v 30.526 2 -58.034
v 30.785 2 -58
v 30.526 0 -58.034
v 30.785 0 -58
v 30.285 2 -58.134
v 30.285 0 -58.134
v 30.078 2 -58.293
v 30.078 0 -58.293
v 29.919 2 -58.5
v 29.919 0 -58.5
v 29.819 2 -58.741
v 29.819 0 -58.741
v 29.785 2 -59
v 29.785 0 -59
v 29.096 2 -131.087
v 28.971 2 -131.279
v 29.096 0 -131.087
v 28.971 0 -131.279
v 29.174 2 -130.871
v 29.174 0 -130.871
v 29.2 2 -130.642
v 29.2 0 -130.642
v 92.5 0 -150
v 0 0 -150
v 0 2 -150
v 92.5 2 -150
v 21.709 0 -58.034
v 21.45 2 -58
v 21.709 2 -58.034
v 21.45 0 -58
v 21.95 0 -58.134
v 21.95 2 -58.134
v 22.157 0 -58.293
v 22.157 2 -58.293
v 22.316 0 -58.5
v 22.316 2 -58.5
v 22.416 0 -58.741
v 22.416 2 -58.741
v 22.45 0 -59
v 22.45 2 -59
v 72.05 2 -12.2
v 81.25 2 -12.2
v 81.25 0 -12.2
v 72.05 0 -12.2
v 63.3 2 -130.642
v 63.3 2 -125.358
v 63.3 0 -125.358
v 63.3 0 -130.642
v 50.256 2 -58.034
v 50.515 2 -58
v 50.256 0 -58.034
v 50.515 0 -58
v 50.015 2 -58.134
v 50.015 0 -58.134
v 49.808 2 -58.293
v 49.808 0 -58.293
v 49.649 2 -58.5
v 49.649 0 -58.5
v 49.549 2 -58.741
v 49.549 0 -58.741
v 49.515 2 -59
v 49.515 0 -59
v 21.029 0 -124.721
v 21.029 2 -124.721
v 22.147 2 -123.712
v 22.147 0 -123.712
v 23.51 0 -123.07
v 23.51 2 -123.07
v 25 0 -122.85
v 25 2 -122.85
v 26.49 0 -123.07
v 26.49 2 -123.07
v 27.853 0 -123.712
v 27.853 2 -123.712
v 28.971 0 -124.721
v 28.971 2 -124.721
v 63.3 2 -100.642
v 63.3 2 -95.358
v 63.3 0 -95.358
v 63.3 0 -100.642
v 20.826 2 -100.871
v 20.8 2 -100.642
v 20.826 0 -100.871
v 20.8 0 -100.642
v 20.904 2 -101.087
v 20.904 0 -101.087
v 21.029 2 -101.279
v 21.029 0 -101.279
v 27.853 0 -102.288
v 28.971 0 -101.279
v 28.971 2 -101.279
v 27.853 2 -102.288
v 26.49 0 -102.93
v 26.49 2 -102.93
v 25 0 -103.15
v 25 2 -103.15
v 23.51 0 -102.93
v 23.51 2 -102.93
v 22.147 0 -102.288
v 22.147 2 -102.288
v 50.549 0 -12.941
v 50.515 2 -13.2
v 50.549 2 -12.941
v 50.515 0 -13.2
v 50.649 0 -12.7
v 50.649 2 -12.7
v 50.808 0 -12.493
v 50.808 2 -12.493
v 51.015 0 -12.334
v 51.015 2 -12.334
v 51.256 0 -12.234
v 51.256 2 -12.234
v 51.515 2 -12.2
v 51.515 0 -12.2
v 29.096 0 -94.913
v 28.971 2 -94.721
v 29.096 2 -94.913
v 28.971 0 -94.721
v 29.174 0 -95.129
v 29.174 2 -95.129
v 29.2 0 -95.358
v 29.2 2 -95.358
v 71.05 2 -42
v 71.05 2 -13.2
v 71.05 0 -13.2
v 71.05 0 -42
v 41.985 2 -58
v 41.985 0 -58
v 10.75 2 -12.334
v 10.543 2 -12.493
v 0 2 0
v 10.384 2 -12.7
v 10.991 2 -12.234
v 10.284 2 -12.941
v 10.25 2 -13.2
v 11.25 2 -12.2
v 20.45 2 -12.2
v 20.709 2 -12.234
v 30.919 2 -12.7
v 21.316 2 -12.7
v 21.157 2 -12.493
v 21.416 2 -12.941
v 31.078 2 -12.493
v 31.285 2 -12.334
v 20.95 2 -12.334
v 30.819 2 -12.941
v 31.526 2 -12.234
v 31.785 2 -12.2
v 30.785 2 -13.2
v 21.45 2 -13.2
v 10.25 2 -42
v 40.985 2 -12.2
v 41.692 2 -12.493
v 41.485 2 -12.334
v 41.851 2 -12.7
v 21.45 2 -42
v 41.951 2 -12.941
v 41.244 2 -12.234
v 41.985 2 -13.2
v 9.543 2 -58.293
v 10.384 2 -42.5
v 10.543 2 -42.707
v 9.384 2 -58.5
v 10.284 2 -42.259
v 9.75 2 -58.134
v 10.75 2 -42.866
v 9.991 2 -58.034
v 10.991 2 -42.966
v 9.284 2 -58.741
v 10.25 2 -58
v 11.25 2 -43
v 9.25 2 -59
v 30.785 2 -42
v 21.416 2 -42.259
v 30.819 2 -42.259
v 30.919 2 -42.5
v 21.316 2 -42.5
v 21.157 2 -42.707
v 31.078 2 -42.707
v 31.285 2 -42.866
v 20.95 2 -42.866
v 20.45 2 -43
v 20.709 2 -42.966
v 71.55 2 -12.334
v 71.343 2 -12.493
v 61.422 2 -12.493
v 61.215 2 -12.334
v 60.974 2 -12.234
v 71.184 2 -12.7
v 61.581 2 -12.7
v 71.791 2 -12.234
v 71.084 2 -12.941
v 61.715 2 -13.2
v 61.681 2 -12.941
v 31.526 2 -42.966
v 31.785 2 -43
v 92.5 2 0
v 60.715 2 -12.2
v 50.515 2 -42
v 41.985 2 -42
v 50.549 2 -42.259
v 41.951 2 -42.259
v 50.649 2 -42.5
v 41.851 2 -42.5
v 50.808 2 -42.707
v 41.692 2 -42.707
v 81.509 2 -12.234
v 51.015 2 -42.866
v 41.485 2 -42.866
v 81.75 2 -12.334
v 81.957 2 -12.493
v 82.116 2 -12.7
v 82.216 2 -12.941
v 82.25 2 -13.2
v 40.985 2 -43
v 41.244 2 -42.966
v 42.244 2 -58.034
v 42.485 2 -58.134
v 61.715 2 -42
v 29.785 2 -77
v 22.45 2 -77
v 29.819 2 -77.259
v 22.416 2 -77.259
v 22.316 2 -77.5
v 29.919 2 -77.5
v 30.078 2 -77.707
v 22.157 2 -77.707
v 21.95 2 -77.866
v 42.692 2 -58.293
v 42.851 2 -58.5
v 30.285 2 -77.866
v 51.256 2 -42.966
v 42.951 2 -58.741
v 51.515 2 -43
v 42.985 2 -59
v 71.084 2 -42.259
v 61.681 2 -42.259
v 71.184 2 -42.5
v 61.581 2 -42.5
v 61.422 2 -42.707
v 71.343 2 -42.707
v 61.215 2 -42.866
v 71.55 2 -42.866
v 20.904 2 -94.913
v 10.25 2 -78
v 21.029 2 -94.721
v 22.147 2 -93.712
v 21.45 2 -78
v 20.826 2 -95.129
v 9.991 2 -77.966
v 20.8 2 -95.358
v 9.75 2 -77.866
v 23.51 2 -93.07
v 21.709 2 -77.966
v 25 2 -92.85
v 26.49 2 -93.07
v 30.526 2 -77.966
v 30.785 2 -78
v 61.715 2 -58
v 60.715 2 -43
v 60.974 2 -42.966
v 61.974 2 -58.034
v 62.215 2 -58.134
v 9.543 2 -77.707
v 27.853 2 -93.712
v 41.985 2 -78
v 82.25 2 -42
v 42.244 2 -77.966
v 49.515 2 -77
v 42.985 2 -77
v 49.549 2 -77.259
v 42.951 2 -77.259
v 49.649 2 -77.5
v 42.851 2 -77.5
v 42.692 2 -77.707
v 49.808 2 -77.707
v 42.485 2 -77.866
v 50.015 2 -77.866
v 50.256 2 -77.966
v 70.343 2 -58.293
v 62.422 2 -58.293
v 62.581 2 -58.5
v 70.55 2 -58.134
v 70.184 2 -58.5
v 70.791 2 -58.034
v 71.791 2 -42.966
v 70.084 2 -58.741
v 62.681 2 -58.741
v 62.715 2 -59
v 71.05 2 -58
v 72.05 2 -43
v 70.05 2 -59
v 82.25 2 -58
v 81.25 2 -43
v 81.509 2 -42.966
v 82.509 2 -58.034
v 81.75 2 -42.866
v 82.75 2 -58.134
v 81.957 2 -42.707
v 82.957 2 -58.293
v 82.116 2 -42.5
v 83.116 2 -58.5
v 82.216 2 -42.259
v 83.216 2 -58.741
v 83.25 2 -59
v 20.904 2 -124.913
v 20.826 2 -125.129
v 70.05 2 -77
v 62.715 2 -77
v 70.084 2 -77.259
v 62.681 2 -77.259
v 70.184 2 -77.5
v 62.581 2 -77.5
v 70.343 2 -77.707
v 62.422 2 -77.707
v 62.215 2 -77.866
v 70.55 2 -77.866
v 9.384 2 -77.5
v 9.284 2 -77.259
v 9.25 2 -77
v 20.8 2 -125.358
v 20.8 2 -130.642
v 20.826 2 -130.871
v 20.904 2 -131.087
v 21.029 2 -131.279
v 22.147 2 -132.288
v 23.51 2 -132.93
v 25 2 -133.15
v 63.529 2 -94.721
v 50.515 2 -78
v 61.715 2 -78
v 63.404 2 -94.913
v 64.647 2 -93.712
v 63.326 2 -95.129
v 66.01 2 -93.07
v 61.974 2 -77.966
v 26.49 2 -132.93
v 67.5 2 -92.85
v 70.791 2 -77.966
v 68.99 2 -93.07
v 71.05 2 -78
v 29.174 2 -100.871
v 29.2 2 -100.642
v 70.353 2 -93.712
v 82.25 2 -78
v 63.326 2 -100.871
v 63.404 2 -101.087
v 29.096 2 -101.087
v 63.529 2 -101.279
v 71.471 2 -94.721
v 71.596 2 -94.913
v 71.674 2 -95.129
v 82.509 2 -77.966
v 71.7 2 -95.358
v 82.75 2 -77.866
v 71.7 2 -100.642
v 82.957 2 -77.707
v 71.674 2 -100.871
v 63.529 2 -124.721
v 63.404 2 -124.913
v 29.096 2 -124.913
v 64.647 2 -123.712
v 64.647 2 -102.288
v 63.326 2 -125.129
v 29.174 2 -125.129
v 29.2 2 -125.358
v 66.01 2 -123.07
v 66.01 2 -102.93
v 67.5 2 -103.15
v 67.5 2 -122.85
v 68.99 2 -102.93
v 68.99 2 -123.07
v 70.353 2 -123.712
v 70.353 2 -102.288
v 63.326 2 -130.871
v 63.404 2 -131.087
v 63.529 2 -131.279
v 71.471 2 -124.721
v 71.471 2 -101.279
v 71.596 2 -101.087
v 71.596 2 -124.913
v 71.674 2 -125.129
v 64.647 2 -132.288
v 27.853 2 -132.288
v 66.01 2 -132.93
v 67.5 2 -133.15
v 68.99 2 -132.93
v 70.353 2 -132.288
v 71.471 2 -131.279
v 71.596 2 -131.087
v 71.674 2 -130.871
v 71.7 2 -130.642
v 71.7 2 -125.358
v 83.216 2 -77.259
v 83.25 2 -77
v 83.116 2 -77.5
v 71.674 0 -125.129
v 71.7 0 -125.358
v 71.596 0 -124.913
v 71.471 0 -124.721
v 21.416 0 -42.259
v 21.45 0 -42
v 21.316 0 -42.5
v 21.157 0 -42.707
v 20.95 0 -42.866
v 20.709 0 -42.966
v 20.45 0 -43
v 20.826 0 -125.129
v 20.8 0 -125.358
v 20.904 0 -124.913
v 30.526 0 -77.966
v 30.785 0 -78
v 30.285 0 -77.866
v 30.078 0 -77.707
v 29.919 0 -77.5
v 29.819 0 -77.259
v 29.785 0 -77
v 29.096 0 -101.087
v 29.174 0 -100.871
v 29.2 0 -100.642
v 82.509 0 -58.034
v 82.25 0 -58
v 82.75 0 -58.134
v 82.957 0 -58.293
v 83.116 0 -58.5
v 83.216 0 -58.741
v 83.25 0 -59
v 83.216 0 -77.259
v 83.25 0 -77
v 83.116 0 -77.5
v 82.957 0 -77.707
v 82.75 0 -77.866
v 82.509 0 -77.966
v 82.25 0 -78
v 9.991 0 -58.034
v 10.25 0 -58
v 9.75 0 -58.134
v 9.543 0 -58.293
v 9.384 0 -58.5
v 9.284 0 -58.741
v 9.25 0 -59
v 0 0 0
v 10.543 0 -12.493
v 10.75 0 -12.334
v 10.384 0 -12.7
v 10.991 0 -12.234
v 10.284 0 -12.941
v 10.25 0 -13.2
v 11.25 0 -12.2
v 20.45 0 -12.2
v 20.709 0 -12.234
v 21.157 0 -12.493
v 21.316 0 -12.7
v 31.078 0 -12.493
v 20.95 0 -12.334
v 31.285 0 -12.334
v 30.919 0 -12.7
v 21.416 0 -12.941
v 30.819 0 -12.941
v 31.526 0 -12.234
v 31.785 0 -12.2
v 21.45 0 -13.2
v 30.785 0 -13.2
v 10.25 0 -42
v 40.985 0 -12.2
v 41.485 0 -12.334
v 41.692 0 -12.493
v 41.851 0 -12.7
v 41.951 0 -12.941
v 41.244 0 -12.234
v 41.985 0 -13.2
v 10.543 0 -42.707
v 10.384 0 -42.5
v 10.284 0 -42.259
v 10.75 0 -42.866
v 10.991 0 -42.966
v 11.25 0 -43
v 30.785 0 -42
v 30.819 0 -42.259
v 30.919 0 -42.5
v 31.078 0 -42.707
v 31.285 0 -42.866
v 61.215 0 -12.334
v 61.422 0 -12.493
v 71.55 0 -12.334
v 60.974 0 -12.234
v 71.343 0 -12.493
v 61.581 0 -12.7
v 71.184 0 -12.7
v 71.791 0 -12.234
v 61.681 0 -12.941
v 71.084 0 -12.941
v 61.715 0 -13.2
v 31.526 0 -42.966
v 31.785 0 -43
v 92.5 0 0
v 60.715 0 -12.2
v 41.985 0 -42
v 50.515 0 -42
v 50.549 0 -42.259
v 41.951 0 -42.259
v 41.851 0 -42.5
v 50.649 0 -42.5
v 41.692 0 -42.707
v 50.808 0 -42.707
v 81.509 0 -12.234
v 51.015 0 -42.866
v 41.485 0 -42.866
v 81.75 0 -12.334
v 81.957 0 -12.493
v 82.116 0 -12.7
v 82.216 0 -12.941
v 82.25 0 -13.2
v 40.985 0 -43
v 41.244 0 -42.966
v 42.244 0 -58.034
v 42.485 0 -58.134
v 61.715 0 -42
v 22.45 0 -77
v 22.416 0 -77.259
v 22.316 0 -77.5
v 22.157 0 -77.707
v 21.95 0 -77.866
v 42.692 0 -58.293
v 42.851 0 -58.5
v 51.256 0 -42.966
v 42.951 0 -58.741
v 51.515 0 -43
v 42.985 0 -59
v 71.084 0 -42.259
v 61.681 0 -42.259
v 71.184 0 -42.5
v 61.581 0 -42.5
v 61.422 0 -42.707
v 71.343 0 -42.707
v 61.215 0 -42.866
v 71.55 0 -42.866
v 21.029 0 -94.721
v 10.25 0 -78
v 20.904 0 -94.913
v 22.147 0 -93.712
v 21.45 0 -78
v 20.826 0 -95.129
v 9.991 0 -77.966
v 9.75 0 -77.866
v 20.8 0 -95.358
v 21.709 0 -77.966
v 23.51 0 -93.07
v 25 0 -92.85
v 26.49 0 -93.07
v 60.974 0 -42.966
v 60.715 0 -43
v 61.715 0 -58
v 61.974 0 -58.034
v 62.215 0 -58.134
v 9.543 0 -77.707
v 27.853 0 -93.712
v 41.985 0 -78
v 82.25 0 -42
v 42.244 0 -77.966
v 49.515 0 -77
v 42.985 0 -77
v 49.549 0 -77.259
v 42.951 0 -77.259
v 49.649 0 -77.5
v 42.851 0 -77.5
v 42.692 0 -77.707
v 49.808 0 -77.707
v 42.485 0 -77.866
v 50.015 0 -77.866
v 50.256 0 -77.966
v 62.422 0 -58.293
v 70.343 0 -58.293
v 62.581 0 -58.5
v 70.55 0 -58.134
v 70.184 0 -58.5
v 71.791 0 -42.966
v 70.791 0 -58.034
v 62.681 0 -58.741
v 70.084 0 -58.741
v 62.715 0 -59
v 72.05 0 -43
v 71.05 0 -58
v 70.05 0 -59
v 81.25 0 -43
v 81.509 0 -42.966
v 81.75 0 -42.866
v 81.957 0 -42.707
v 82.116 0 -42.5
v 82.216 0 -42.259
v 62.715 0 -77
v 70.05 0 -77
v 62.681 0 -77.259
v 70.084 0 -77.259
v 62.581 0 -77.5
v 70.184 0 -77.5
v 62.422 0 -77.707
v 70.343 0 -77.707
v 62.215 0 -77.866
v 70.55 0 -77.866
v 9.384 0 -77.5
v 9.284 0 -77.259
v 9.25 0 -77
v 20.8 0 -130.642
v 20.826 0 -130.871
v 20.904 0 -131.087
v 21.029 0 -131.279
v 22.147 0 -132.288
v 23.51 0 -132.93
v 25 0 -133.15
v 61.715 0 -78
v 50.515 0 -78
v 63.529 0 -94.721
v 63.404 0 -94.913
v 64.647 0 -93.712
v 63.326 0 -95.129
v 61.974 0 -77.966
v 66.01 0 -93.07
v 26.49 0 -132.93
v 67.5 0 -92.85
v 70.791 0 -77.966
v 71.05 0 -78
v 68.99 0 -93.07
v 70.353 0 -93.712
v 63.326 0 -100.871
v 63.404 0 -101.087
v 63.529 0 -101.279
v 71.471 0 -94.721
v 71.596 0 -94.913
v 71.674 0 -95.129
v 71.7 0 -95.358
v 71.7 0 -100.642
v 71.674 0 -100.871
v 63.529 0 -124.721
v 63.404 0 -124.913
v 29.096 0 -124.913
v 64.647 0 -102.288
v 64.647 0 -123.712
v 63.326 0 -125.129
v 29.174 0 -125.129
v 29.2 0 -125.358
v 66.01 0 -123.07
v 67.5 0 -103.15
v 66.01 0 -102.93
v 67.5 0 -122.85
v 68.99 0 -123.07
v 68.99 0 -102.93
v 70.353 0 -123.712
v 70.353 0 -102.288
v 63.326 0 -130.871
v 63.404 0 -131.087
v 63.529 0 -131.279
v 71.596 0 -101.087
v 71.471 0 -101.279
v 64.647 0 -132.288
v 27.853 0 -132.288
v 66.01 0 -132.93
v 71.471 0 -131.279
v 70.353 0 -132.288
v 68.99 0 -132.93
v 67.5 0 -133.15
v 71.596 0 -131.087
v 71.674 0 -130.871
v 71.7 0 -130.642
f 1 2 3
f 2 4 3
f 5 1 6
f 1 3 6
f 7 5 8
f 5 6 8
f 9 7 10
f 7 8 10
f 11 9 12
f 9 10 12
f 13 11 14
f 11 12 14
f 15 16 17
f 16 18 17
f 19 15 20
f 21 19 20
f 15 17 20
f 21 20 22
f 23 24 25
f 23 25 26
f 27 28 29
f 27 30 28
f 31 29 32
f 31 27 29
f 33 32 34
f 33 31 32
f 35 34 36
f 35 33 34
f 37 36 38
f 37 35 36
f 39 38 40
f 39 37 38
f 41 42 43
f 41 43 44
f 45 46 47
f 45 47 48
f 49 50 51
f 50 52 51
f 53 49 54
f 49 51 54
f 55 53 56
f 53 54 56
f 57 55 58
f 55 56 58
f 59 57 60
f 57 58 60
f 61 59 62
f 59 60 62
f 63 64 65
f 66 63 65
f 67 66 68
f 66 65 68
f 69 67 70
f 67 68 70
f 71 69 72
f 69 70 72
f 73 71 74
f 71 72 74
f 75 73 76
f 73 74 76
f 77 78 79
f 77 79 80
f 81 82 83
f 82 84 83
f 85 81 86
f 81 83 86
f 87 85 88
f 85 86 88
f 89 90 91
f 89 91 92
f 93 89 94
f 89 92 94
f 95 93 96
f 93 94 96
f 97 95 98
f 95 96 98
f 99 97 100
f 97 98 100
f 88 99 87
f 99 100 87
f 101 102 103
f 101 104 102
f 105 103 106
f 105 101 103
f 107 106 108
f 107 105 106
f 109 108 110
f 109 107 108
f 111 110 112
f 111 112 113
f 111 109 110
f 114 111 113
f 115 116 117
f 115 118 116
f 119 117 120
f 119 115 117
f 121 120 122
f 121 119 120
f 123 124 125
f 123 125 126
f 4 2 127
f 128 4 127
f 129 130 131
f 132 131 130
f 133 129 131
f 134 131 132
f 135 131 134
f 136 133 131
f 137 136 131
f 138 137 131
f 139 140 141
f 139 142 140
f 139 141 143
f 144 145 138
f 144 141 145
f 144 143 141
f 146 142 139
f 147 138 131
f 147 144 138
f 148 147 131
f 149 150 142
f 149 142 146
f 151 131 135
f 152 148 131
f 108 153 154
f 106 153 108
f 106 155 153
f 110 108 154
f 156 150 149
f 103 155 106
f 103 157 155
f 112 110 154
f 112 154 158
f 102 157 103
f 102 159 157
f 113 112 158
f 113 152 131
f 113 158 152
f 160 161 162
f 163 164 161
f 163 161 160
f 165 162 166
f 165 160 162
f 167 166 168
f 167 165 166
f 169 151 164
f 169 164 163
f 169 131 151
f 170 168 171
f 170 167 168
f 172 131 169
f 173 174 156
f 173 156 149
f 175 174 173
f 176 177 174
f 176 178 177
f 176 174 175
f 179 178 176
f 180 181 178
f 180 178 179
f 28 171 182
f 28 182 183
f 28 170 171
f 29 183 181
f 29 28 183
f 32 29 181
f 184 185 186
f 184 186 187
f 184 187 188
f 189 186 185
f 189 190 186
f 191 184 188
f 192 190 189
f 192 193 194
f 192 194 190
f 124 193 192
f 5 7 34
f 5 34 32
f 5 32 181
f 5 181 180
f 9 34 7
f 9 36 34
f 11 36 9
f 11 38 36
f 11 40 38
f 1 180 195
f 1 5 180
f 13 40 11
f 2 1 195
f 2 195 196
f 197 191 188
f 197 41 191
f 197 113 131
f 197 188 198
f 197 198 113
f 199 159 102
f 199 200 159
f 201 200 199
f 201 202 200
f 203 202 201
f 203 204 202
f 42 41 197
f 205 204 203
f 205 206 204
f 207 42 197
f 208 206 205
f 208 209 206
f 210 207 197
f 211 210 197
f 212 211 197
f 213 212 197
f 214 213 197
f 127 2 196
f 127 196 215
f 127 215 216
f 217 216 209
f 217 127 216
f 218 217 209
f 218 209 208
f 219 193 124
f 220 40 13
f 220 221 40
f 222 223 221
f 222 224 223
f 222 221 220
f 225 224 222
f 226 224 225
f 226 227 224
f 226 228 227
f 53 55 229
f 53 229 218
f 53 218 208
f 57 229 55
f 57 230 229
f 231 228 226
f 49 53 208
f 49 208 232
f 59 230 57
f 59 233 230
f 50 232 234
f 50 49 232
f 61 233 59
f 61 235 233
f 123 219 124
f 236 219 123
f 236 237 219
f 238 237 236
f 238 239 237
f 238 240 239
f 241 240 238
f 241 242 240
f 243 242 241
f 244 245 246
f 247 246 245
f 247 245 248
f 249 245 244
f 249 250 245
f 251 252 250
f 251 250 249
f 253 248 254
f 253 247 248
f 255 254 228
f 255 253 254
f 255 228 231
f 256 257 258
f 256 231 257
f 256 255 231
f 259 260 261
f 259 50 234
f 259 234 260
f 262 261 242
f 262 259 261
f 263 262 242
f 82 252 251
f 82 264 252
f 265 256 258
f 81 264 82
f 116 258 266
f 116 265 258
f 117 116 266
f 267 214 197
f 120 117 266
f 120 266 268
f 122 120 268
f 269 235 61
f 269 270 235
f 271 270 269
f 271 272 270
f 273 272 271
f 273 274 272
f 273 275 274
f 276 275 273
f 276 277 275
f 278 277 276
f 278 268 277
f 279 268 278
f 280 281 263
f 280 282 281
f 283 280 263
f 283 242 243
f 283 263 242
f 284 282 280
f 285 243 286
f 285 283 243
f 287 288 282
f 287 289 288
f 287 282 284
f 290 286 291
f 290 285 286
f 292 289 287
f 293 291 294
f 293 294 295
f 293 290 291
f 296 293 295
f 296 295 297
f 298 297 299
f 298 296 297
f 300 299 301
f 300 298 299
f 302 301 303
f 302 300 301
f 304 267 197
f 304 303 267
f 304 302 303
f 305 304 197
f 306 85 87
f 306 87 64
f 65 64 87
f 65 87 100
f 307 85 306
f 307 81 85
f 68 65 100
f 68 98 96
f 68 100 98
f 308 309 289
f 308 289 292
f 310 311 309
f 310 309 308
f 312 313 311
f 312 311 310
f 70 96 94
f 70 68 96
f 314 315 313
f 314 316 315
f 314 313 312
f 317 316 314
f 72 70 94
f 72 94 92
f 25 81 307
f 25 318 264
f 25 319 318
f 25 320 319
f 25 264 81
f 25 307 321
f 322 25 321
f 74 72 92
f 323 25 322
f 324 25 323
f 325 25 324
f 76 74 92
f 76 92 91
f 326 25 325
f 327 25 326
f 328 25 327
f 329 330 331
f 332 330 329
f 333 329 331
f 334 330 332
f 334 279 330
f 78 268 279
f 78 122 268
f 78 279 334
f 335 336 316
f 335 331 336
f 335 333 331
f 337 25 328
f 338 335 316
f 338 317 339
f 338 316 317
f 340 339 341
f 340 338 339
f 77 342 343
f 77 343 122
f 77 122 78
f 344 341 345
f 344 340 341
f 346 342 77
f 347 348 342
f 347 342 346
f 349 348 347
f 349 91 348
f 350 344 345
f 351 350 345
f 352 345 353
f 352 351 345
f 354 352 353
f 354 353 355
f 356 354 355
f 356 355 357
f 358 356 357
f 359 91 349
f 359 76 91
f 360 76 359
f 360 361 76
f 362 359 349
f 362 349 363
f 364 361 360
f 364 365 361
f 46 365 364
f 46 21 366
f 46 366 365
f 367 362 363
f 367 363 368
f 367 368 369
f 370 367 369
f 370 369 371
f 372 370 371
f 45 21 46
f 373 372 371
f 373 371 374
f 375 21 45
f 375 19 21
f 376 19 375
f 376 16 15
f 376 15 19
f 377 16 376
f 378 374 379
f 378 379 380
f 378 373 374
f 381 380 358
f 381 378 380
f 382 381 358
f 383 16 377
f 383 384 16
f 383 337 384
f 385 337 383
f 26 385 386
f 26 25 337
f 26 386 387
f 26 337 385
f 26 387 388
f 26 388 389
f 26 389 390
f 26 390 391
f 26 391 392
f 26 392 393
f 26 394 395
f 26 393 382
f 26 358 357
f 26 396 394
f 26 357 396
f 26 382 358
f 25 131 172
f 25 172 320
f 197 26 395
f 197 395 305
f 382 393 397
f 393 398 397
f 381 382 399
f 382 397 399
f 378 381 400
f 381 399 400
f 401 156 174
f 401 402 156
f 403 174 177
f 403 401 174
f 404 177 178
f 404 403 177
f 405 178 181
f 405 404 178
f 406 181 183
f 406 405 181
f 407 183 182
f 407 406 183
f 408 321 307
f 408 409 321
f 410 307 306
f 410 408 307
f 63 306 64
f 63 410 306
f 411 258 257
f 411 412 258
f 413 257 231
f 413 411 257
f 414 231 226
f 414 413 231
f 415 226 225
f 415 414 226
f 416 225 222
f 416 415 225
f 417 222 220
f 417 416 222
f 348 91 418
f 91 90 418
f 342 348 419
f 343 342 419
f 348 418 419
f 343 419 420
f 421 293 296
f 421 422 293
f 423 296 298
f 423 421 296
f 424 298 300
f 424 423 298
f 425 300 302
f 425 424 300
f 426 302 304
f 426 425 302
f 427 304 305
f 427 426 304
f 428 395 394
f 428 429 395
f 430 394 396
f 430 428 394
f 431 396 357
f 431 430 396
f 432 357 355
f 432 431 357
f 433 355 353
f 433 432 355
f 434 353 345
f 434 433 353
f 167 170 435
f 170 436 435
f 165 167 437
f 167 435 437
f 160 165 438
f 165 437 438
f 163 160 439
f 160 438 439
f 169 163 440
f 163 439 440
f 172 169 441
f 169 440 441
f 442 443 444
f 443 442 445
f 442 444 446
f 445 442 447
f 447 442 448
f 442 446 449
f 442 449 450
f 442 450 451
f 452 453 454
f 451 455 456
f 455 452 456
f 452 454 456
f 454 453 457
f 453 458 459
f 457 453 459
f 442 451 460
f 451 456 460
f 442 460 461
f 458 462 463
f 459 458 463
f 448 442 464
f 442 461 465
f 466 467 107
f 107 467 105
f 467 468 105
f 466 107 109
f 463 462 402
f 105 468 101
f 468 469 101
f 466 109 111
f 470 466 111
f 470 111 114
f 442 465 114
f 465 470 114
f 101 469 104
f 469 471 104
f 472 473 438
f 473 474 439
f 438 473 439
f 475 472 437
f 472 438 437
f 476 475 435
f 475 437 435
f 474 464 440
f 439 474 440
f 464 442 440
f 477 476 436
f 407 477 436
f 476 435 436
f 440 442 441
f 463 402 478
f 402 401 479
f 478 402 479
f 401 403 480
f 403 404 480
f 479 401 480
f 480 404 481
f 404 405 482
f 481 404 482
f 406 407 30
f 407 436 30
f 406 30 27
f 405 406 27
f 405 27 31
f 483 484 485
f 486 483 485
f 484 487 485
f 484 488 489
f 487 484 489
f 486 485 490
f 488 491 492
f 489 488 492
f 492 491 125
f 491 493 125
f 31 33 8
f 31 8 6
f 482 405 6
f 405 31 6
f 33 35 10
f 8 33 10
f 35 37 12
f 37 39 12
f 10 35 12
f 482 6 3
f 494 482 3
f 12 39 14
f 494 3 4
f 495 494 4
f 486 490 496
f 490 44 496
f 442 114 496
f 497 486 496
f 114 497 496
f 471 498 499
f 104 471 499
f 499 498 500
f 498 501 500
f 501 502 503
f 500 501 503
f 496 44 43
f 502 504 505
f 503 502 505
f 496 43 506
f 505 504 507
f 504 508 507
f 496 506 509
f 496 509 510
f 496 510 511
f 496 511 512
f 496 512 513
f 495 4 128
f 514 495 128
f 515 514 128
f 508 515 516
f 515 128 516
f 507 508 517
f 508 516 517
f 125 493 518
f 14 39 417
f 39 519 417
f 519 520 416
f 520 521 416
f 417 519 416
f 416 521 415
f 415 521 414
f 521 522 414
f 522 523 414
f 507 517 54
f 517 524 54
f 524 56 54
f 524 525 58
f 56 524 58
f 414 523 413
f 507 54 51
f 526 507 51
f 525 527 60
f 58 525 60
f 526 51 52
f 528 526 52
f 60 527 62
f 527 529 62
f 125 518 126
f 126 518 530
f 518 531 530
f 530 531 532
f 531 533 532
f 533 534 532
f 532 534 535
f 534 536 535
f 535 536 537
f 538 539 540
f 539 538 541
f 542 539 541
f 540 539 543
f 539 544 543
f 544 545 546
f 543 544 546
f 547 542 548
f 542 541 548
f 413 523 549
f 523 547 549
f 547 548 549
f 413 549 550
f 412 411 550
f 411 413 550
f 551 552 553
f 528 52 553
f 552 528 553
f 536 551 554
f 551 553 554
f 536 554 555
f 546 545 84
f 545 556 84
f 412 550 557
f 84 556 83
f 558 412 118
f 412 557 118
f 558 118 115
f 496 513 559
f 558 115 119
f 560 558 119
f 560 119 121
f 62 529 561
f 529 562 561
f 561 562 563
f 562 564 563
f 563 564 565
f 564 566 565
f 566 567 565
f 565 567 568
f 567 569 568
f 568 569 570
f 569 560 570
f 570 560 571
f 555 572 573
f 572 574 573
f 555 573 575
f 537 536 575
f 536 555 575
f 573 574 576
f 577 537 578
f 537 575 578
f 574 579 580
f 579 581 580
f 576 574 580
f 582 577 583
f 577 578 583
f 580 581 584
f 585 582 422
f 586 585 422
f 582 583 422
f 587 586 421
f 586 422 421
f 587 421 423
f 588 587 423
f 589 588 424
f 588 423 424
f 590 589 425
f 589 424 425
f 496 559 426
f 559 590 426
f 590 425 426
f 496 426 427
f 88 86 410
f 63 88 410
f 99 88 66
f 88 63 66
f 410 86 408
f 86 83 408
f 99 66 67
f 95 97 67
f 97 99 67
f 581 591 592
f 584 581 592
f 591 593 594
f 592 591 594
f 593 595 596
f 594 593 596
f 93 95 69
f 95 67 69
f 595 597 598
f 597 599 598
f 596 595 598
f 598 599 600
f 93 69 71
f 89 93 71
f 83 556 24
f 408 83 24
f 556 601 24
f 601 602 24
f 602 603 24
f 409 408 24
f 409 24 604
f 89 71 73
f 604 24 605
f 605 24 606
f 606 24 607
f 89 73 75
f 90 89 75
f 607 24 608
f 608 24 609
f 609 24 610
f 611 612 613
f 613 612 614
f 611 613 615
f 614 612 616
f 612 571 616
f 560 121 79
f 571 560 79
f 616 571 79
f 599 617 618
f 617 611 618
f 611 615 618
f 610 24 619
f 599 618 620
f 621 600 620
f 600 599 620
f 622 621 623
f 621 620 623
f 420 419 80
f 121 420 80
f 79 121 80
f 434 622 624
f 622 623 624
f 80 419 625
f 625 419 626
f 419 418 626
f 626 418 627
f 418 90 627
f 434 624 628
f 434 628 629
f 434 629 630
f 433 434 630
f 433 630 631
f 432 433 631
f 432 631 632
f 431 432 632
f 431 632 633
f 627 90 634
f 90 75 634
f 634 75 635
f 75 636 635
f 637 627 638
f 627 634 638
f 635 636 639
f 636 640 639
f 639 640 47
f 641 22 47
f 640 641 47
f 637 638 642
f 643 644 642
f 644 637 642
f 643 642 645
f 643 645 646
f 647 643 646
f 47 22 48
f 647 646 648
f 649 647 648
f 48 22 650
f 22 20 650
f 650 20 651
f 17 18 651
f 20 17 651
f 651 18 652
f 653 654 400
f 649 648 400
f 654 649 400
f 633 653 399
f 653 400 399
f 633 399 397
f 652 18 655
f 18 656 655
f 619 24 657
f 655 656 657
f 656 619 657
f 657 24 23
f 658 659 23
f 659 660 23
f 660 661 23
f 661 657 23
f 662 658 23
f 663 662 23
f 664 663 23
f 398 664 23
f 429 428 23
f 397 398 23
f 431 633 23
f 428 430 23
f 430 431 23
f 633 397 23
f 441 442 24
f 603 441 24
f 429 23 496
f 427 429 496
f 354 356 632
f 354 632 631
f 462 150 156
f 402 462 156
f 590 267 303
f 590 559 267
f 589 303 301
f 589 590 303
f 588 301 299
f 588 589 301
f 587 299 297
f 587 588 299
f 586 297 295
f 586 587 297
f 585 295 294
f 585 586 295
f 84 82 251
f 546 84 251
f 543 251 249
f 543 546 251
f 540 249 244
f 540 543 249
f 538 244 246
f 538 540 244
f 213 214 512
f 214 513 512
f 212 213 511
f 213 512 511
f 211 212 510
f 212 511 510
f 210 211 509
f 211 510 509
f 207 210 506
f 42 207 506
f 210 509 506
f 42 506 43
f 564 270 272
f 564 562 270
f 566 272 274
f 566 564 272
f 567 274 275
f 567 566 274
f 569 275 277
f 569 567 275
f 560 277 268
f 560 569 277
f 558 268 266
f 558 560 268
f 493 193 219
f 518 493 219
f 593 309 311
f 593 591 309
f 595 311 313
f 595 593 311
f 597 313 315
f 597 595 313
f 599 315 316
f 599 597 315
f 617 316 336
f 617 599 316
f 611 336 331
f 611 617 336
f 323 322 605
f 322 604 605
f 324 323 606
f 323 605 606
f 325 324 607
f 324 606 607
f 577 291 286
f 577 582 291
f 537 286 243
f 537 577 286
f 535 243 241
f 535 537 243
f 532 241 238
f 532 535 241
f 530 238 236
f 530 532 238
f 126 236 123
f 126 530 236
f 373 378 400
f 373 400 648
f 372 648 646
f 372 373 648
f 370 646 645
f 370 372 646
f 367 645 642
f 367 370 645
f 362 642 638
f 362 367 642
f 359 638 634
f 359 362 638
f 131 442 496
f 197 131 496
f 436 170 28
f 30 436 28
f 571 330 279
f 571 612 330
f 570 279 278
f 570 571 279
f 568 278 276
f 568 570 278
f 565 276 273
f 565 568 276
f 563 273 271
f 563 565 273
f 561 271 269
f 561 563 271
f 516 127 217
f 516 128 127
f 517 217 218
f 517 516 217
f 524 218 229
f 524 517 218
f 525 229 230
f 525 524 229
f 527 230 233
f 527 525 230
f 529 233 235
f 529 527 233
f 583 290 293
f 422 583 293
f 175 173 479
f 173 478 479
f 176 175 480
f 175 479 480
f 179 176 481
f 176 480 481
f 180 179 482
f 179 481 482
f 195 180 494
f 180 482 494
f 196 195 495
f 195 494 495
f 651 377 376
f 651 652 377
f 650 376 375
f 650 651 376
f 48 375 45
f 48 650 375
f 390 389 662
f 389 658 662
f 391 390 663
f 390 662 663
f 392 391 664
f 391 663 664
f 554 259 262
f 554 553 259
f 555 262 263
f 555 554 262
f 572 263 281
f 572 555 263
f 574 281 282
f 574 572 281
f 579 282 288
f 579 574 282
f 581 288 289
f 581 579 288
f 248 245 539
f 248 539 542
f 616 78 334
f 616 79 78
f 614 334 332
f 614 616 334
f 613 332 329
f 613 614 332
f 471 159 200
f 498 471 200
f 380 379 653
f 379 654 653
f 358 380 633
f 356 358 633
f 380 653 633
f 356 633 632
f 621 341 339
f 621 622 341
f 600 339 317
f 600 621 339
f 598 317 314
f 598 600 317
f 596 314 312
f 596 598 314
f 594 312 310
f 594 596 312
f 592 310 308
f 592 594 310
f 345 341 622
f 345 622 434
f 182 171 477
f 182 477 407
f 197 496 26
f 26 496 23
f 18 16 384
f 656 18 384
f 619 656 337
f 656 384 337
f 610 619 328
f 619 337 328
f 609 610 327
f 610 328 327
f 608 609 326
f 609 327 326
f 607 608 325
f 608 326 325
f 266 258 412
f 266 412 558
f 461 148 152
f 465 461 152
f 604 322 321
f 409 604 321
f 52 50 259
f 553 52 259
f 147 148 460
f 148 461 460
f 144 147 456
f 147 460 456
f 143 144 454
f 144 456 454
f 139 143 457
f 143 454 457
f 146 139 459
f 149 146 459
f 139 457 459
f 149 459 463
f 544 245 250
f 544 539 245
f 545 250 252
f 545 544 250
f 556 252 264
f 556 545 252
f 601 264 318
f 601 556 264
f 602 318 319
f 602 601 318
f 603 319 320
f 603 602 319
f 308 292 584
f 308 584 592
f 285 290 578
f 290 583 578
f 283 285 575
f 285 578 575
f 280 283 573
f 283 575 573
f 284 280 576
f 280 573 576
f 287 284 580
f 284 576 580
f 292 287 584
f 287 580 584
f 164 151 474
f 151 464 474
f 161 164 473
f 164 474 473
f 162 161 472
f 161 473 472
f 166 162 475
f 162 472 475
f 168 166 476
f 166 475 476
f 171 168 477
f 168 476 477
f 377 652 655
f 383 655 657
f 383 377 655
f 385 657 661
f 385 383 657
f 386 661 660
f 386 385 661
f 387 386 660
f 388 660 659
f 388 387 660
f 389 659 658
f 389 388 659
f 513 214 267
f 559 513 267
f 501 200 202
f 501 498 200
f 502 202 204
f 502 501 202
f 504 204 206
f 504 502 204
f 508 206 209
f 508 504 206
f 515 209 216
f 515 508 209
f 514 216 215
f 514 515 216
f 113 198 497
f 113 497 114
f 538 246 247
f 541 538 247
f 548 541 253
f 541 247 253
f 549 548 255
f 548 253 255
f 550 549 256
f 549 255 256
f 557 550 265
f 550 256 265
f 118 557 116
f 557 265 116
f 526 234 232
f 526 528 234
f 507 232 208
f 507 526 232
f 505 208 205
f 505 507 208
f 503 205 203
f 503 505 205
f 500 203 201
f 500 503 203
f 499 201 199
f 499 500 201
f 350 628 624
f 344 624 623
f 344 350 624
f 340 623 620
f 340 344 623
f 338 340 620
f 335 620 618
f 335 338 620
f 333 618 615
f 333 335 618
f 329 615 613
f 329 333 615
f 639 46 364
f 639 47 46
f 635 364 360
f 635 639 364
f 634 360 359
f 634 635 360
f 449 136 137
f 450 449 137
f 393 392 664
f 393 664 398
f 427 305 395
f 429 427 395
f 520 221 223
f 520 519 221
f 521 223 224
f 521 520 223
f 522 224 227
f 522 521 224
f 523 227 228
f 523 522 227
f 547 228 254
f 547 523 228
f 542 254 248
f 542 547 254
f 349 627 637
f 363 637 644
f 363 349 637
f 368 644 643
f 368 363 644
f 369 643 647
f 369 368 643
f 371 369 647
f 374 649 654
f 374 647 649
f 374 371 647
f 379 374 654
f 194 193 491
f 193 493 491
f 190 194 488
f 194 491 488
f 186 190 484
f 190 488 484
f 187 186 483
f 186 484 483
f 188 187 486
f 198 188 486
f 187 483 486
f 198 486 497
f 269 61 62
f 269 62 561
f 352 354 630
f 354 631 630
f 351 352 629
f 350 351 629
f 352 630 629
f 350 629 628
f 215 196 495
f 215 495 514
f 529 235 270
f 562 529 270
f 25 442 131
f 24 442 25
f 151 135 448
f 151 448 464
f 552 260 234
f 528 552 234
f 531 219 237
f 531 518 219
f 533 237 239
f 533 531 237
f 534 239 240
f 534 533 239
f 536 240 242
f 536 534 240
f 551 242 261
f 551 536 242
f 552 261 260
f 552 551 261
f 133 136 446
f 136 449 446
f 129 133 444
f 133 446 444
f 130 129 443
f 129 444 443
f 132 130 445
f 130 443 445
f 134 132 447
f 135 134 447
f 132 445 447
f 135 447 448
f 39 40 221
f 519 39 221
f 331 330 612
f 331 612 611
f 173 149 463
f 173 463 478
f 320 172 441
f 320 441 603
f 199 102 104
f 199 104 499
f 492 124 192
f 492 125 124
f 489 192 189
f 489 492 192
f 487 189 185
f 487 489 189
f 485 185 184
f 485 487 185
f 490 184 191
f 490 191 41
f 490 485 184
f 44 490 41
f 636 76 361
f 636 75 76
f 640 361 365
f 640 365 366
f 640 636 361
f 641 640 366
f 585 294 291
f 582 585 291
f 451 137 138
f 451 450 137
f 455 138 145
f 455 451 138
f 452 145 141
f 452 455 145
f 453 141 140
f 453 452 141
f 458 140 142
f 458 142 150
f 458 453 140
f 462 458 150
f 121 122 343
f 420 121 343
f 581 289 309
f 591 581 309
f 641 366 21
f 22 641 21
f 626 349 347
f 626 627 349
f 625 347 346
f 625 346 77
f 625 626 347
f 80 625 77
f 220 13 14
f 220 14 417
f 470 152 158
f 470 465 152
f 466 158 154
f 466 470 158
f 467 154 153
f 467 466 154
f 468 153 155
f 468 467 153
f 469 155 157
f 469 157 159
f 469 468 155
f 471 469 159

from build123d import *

# Parameters (mm, degrees)
SKIZZE1_W                       = 92.5
SKIZZE1_H                       = 150
AUFSATZ_LINEAR_AUSTRAGEN1_DEPTH = 2
SCHNITT_LINEAR_AUSTRAGEN1_DEPTH = 177.239184065
LINEARES_MUSTER1_COUNT          = 2
LINEARES_MUSTER1_PITCH          = 30
SPIEGELN1_COPY_1_DEPTH          = 177.239184065
SKIZZE3_W                       = 13.2
SKIZZE3_H                       = 20
SCHNITT_LINEAR_AUSTRAGEN2_DEPTH = 177.239184065
VERRUNDUNG1_R                   = 1
VERRUNDUNG2_R                   = 1
SKIZZE4_W                       = 11.2
SKIZZE4_H                       = 30.8
SCHNITT_LINEAR_AUSTRAGEN3_DEPTH = 177.239184065
VERRUNDUNG3_R                   = 1


with BuildPart() as part:
    # Skizze1 → Aufsatz-Linear austragen1 (new body)
    with BuildSketch(Plane(origin=(0, 0, 0), x_dir=(1, 0, 0), z_dir=(0, 1, 0))):
        with Locations((46.25, 75)):
            Rectangle(SKIZZE1_W, SKIZZE1_H)
    extrude(amount=AUFSATZ_LINEAR_AUSTRAGEN1_DEPTH)

    # Skizze2 → Schnitt-Linear austragen1 (cut, through all)
    with BuildSketch(Plane(origin=(0, 2, 0), x_dir=(1, 0, 0), z_dir=(0, 1, 0))):
        with BuildLine():
            Line((20.8, 130.980352328), (20.8, 125.019647672))
            ThreePointArc((20.8, 125.019647672), (25, 122.85), (29.2, 125.019647672))
            Line((29.2, 125.019647672), (29.2, 130.980352328))
            ThreePointArc((29.2, 130.980352328), (25, 133.15), (20.8, 130.980352328))
        make_face()
    schnitt_linear_austragen1 = extrude(amount=-SCHNITT_LINEAR_AUSTRAGEN1_DEPTH, mode=Mode.SUBTRACT)

    # Lineares Muster1: Schnitt-Linear austragen1 ×2
    with Locations(*[(0, 0, i * LINEARES_MUSTER1_PITCH) for i in range(1, LINEARES_MUSTER1_COUNT)]):
        add(schnitt_linear_austragen1, mode=Mode.SUBTRACT)

    # Spiegeln1: Schnitt-Linear austragen1 across plane
    add(schnitt_linear_austragen1.mirror(Plane(origin=(46.25, 0, 0), x_dir=(0, 0, 1), z_dir=(1, 0, 0))), mode=Mode.SUBTRACT)

    # Spiegeln1 copy 1 sketch → Spiegeln1 copy 1 (cut, through all)
    with BuildSketch(Plane(origin=(92.5, 2, 30), x_dir=(-1, 0, 0), z_dir=(0, 1, 0))):
        with BuildLine():
            Line((20.8, -130.980352328), (20.8, -125.019647672))
            ThreePointArc((20.8, -125.019647672), (25, -122.85), (29.2, -125.019647672))
            Line((29.2, -125.019647672), (29.2, -130.980352328))
            ThreePointArc((29.2, -130.980352328), (25, -133.15), (20.8, -130.980352328))
        make_face()
    extrude(amount=-SPIEGELN1_COPY_1_DEPTH, mode=Mode.SUBTRACT)

    # Skizze3 → Schnitt-Linear austragen2 (cut, through all)
    with BuildSketch(Plane(origin=(0, 2, 0), x_dir=(1, 0, 0), z_dir=(0, 1, 0))):
        with Locations((15.85, 68)):
            Rectangle(SKIZZE3_W, SKIZZE3_H)
        with Locations((56.115, 68)):
            Rectangle(SKIZZE3_W, SKIZZE3_H)
        with Locations((36.385, 68)):
            Rectangle(SKIZZE3_W, SKIZZE3_H)
        with Locations((76.65, 68)):
            Rectangle(SKIZZE3_W, SKIZZE3_H)
    extrude(amount=-SCHNITT_LINEAR_AUSTRAGEN2_DEPTH, mode=Mode.SUBTRACT)

    # Verrundung1
    verrundung1_edges = [part.edges().sort_by_distance(p)[0] for p in [
        (29.785, 1, -58),
        (29.785, 1, -78),
        (42.985, 1, -78),
        (42.985, 1, -58),
        (62.715, 1, -58),
        (49.515, 1, -58),
        (49.515, 1, -78),
        (62.715, 1, -78),
        (83.25, 1, -58),
        (70.05, 1, -58),
        (70.05, 1, -78),
        (83.25, 1, -78),
        (9.25, 1, -58),
        (9.25, 1, -78),
        (22.45, 1, -78),
        (22.45, 1, -58),
    ]]
    fillet(verrundung1_edges, radius=VERRUNDUNG1_R)

    # Verrundung2
    verrundung2_edges = [part.edges().sort_by_distance(p)[0] for p in [
        (20.8, 1, -130.980352328),
        (29.2, 1, -130.980352328),
        (29.2, 1, -125.019647672),
        (20.8, 1, -125.019647672),
        (20.8, 1, -100.980352328),
        (29.2, 1, -100.980352328),
        (29.2, 1, -95.019647672),
        (20.8, 1, -95.019647672),
        (63.3, 1, -130.980352328),
        (71.7, 1, -130.980352328),
        (71.7, 1, -125.019647672),
        (63.3, 1, -125.019647672),
        (63.3, 1, -100.980352328),
        (71.7, 1, -100.980352328),
        (71.7, 1, -95.019647672),
        (63.3, 1, -95.019647672),
    ]]
    fillet(verrundung2_edges, radius=VERRUNDUNG2_R)

    # Skizze4 → Schnitt-Linear austragen3 (cut, through all)
    with BuildSketch(Plane(origin=(0, 2, 0), x_dir=(1, 0, 0), z_dir=(0, 1, 0))):
        with Locations((15.85, 27.6)):
            Rectangle(SKIZZE4_W, SKIZZE4_H)
        with Locations((36.385, 27.6)):
            Rectangle(SKIZZE4_W, SKIZZE4_H)
    schnitt_linear_austragen3 = extrude(amount=-SCHNITT_LINEAR_AUSTRAGEN3_DEPTH, mode=Mode.SUBTRACT)

    # Spiegeln2: Schnitt-Linear austragen3 across plane
    add(schnitt_linear_austragen3.mirror(Plane(origin=(46.25, 0, 0), x_dir=(0, 0, 1), z_dir=(1, 0, 0))), mode=Mode.SUBTRACT)

    # Verrundung3
    verrundung3_edges = [part.edges().sort_by_distance(p)[0] for p in [
        (10.25, 1, -12.2),
        (10.25, 1, -43),
        (21.45, 1, -43),
        (21.45, 1, -12.2),
        (30.785, 1, -12.2),
        (30.785, 1, -43),
        (41.985, 1, -43),
        (41.985, 1, -12.2),
        (82.25, 1, -43),
        (82.25, 1, -12.2),
        (71.05, 1, -12.2),
        (71.05, 1, -43),
        (61.715, 1, -43),
        (61.715, 1, -12.2),
        (50.515, 1, -12.2),
        (50.515, 1, -43),
    ]]
    fillet(verrundung3_edges, radius=VERRUNDUNG3_R)


solid = part.part
